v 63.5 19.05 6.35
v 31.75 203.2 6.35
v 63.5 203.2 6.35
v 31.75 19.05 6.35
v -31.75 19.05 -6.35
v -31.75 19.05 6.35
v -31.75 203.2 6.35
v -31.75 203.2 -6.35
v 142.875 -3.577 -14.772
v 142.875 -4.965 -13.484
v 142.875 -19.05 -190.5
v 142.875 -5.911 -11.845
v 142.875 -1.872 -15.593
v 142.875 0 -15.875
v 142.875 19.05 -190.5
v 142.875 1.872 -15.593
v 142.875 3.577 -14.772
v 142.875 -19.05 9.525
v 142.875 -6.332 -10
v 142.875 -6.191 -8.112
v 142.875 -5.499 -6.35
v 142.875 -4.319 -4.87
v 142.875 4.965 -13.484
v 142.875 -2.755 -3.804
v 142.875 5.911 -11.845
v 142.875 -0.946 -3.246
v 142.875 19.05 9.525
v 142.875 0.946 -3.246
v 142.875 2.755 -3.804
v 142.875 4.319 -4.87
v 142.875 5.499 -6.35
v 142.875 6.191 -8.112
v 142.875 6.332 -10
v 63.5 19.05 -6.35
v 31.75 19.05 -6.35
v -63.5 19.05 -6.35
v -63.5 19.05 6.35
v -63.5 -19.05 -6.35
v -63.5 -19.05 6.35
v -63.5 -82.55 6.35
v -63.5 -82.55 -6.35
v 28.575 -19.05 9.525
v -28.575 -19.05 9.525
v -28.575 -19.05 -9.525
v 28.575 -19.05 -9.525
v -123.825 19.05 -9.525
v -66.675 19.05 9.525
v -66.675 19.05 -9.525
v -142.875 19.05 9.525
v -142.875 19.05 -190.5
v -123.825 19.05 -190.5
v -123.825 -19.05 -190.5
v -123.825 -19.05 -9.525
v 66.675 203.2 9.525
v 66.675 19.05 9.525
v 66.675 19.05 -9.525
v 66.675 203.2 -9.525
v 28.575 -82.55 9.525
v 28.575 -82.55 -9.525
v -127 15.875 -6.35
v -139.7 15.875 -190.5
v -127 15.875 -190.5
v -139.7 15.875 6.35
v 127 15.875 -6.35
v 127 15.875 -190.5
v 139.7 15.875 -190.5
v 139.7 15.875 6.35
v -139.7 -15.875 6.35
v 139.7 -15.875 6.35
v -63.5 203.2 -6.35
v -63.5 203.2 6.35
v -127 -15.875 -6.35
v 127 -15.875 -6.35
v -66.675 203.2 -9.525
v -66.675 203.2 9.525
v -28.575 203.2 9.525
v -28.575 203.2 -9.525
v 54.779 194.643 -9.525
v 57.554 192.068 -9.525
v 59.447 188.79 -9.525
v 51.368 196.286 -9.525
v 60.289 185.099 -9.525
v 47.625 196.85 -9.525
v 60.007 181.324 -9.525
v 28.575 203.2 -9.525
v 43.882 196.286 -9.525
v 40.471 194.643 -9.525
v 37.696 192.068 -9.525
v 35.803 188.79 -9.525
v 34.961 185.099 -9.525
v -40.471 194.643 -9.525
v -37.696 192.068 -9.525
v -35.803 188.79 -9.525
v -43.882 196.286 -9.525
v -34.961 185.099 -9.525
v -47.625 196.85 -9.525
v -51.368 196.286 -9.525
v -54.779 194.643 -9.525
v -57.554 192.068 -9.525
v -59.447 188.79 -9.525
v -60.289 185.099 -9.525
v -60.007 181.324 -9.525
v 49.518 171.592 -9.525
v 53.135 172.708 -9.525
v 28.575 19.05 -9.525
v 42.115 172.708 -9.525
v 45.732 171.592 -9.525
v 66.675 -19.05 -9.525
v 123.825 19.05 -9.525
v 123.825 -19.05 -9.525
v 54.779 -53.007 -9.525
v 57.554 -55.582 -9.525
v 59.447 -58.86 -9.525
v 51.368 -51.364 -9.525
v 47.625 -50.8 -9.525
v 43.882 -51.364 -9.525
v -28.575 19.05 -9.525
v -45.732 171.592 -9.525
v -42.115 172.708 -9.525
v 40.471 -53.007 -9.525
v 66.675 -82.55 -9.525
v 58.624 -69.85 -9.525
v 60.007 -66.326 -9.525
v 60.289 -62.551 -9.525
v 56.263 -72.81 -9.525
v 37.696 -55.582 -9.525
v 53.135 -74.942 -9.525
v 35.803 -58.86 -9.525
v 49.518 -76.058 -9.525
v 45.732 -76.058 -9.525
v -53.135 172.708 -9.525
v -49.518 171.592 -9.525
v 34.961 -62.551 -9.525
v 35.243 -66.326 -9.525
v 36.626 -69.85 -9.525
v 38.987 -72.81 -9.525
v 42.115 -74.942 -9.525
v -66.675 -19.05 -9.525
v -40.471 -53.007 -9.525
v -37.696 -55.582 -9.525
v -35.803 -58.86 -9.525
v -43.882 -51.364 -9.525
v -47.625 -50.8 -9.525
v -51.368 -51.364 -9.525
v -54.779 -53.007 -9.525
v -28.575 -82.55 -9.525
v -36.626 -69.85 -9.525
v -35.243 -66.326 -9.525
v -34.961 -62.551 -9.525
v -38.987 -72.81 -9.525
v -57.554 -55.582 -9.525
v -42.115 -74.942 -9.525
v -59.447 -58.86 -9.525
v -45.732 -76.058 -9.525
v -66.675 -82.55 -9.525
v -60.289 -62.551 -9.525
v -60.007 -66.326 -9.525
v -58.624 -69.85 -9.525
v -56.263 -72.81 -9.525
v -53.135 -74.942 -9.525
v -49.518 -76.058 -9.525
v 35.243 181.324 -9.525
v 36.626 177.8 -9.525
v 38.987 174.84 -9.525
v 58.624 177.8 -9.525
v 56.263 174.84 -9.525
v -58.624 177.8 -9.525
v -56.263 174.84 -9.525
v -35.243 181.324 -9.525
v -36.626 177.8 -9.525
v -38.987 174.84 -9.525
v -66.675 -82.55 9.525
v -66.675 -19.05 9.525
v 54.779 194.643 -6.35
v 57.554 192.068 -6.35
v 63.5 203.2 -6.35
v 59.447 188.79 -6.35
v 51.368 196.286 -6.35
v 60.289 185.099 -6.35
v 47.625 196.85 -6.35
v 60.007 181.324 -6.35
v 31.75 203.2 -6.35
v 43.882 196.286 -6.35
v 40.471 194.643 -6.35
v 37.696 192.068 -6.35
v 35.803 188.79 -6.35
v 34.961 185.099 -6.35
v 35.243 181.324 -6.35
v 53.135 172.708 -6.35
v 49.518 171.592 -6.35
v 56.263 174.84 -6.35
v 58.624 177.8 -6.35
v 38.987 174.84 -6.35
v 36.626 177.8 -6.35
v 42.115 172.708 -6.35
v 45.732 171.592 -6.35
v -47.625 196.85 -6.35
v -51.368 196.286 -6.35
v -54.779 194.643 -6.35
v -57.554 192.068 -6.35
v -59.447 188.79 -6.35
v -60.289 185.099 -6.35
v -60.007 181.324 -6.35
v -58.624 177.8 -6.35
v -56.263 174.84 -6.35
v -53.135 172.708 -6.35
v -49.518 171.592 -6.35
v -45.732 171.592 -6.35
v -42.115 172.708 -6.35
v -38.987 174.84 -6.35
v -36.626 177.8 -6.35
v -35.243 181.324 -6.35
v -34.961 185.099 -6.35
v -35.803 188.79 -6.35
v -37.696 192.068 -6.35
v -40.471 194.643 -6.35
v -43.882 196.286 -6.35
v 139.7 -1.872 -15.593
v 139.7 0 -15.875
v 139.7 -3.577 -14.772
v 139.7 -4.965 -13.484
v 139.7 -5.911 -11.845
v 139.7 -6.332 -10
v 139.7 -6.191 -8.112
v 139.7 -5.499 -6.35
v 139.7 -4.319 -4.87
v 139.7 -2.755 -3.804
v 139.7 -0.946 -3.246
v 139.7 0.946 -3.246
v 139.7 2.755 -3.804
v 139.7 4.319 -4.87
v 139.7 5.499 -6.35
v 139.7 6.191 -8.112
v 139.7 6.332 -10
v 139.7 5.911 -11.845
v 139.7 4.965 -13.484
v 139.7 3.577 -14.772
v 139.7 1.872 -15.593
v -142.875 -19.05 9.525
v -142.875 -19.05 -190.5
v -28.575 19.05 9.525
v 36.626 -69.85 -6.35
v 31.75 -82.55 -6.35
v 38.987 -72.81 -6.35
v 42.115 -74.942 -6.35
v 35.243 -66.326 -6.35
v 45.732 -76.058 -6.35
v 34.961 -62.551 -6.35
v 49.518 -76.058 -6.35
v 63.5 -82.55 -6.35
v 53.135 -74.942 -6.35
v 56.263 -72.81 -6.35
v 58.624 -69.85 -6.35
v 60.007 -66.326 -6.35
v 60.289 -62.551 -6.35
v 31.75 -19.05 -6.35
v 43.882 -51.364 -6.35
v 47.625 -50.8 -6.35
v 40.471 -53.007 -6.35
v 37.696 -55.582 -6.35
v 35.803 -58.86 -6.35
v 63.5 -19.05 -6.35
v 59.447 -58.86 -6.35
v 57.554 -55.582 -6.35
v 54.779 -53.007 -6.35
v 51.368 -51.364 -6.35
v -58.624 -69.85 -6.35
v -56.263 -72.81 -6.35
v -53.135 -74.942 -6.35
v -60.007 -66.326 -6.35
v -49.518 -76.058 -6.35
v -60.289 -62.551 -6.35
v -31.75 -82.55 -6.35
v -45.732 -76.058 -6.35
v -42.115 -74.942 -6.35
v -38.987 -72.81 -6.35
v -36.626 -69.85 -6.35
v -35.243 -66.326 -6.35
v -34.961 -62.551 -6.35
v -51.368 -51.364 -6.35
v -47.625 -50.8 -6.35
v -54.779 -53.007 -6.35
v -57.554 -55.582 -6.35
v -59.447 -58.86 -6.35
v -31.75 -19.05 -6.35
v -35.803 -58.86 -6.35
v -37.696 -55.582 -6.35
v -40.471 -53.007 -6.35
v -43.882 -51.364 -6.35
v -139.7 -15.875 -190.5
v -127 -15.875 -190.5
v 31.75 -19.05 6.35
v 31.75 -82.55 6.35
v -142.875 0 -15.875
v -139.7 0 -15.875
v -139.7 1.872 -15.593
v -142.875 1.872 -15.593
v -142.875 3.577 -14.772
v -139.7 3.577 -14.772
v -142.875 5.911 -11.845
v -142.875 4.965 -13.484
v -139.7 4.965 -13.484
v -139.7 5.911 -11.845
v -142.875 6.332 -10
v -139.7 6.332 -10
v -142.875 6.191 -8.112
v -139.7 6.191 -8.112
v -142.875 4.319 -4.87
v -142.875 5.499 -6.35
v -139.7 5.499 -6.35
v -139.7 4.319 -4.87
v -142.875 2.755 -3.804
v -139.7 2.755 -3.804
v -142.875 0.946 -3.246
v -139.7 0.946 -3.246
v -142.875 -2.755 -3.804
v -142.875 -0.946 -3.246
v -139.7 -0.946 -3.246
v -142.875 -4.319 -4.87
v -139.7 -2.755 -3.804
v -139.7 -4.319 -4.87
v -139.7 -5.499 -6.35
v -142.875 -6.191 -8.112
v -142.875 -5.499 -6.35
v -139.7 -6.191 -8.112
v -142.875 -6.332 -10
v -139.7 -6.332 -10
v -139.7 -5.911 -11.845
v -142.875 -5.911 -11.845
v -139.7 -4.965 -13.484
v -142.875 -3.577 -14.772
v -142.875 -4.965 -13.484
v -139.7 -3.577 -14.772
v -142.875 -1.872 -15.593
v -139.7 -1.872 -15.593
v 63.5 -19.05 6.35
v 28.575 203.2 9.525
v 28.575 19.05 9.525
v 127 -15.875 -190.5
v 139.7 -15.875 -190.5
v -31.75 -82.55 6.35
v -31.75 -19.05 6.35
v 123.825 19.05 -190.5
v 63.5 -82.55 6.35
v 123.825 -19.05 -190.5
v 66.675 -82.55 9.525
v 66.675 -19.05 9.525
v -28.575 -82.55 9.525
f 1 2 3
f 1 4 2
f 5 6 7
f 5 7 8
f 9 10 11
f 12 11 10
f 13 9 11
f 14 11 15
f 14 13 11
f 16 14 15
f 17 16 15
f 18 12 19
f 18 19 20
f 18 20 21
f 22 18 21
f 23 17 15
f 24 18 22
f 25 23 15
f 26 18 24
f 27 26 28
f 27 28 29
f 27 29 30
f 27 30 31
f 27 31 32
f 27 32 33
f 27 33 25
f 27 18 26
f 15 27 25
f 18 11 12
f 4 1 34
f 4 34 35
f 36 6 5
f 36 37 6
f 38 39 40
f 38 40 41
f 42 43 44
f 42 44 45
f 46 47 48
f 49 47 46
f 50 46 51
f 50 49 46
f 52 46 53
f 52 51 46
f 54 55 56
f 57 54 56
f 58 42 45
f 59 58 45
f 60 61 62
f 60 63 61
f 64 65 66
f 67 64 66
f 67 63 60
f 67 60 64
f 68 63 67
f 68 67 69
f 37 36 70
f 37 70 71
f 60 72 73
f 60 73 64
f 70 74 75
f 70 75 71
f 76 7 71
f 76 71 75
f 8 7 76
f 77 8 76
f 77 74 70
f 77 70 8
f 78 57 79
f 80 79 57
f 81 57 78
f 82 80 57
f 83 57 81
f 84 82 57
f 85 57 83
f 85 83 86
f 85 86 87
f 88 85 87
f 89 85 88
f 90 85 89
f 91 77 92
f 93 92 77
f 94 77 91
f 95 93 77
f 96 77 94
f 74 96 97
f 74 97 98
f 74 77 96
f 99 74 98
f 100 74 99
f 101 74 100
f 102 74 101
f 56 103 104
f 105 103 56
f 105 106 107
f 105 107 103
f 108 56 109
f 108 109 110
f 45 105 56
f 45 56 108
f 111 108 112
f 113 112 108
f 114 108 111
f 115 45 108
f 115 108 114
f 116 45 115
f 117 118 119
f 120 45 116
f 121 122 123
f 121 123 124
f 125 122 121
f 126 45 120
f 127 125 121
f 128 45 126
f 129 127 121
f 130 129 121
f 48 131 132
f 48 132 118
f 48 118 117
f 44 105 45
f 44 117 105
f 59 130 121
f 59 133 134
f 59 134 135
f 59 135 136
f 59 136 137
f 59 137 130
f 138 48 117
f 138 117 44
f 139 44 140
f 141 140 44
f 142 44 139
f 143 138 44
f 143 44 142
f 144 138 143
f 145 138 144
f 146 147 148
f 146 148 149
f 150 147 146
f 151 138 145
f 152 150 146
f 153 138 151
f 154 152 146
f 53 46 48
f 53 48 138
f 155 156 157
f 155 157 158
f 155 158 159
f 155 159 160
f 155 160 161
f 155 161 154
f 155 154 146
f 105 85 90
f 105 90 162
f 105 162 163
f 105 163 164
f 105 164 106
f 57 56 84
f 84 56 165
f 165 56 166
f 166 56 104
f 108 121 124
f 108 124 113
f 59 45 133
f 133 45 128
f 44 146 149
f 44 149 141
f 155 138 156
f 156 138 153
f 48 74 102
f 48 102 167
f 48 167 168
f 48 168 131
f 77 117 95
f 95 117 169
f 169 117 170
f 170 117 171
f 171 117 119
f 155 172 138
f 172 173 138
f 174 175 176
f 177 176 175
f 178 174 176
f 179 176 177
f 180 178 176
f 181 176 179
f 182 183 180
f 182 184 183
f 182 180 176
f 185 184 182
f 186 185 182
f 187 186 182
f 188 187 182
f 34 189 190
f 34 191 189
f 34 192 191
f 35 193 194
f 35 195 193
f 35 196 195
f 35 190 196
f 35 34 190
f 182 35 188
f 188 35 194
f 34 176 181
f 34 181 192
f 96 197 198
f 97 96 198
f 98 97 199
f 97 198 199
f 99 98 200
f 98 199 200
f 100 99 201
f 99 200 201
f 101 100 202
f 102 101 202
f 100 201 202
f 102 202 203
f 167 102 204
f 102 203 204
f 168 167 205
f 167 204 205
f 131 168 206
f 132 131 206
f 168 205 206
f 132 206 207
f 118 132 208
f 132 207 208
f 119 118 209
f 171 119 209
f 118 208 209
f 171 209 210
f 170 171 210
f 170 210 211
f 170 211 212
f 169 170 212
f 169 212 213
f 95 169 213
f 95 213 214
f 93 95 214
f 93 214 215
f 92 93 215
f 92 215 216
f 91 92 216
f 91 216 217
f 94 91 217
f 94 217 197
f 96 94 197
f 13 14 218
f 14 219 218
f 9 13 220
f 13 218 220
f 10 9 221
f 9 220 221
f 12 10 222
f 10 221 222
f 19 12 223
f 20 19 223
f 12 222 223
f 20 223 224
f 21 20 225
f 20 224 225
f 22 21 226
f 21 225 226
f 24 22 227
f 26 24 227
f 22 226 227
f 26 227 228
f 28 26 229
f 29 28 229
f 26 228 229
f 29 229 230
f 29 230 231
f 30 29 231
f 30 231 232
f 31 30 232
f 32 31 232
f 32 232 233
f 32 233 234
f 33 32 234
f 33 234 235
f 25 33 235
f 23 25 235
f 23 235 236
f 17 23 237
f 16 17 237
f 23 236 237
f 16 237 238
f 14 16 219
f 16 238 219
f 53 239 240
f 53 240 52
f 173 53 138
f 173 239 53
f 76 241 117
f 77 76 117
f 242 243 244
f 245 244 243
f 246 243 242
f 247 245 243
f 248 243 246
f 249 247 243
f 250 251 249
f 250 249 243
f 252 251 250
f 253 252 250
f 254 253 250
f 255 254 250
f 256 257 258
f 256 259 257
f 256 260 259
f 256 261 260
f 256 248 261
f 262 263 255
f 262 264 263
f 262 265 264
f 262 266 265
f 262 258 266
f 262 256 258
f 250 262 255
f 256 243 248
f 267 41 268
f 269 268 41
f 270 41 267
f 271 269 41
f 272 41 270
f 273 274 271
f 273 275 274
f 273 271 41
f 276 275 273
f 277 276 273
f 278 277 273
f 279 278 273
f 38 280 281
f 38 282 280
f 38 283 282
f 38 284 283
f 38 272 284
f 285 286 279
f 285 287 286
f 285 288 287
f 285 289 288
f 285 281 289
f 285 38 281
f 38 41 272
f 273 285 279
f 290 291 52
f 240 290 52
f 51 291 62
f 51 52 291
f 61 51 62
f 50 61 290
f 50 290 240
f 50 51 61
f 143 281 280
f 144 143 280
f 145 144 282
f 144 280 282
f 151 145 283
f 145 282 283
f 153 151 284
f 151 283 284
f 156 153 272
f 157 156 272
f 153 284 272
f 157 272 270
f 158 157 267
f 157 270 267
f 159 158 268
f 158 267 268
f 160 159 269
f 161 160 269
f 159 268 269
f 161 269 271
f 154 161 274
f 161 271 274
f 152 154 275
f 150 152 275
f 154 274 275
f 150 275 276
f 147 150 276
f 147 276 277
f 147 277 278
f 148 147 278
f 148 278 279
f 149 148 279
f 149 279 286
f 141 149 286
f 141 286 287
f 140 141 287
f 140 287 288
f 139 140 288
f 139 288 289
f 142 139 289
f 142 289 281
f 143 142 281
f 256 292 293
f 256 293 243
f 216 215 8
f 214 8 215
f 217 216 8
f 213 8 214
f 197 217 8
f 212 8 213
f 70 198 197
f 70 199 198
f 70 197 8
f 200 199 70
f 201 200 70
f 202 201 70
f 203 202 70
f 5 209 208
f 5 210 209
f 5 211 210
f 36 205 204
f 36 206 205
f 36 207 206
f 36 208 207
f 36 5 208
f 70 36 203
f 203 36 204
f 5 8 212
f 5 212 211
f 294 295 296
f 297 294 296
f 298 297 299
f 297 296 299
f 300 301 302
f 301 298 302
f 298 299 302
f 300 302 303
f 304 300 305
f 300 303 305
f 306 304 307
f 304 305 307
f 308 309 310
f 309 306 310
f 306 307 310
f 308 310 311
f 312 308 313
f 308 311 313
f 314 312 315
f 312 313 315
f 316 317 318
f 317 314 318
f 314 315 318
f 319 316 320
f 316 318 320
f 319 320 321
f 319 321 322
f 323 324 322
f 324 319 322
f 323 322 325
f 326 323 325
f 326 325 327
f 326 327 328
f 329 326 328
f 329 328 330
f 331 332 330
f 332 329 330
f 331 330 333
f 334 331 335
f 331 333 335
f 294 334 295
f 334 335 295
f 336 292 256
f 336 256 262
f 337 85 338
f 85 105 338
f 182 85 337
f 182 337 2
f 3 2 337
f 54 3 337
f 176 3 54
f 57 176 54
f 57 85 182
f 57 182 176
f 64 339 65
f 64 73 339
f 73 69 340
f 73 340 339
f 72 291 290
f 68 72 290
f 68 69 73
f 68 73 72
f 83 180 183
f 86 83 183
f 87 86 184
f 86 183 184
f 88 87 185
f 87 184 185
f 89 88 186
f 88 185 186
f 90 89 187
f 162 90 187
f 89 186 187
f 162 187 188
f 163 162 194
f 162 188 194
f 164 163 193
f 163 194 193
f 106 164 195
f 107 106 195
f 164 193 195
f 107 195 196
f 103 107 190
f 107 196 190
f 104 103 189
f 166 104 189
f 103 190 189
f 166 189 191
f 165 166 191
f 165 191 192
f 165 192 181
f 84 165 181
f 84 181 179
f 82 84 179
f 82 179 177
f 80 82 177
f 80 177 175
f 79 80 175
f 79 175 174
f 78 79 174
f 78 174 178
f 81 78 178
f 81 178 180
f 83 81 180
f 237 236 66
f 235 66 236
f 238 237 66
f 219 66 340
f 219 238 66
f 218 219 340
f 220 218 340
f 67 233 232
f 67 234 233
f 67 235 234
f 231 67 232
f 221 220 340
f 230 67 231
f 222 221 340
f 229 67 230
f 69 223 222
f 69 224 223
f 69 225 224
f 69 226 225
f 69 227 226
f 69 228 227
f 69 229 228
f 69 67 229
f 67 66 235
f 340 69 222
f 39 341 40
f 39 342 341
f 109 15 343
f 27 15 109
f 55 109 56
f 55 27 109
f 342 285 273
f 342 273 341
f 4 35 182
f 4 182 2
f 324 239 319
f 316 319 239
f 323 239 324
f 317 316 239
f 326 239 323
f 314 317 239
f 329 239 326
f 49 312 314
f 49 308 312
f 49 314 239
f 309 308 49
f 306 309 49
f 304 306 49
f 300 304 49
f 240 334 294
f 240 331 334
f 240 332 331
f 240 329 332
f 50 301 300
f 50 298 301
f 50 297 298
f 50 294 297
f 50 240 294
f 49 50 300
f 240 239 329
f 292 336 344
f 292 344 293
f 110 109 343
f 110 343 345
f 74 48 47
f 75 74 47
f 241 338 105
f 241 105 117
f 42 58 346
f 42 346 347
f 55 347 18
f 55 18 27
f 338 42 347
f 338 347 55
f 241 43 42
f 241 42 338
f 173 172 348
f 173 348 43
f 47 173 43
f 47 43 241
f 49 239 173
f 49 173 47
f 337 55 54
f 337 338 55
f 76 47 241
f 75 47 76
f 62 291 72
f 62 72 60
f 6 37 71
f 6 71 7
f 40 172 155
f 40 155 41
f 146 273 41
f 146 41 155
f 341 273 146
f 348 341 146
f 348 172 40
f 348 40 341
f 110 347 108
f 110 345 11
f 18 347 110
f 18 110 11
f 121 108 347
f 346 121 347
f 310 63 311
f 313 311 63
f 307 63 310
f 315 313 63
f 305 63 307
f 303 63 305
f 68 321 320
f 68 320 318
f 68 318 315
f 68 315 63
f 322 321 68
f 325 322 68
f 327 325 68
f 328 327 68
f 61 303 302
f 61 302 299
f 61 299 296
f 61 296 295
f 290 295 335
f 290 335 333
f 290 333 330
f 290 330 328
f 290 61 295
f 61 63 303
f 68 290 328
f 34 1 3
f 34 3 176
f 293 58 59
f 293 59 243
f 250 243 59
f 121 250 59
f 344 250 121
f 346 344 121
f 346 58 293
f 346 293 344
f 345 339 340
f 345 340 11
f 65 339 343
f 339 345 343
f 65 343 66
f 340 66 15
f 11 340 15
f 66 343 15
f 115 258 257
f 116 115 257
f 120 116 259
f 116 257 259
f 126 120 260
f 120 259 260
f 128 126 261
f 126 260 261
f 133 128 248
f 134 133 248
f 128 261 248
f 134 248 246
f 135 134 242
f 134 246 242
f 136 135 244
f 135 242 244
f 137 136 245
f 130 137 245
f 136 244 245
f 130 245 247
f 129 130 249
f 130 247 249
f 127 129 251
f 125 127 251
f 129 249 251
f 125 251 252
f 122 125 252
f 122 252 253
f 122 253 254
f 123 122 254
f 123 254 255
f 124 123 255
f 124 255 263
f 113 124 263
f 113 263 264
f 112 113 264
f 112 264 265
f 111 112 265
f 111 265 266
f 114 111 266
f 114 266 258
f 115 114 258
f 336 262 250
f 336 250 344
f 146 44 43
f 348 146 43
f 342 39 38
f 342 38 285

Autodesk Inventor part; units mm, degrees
ref_plane "XZ Plane" through (0, 0, 0) normal (0, 1, 0) x (-1, 0, 0)
sketch "Sketch1" plane through (0, 0, 0) normal (0, 1, 0) x (-1, 0, 0)
  line L0 (0, 0) -> (133.35, 0)
  line L1 (133.35, 0) -> (133.35, -190.5)
  line L2 (0, 0) -> (0, -190.5) construction
  line L3 (0, 0) -> (-133.35, 0)
  line L4 (-133.35, 0) -> (-133.35, -190.5)
  dimension "d0" = 133.35
  dimension "d1" = 190.5
  dimension "d2" = 190.5
ref_plane "Work Plane1" through (0, 0, -190.5) normal (0, 0, 1) x (1, 0, 0)
sketch "Sketch3" plane through (0, 0, -190.5) normal (0, 0, 1) x (1, 0, 0)
  line L0 (142.875, -19.05) -> (123.825, -19.05)
  line L1 (123.825, -19.05) -> (123.825, 19.05)
  line L2 (123.825, 19.05) -> (142.875, 19.05)
  line L3 (142.875, 19.05) -> (142.875, -19.05)
  line L4 (142.875, -19.05) -> (123.825, 19.05) construction
  line L5 (123.825, -19.05) -> (142.875, 19.05) construction
  line L6 (139.7, -15.875) -> (127, -15.875)
  line L7 (127, -15.875) -> (127, 15.875)
  line L8 (127, 15.875) -> (139.7, 15.875)
  line L9 (139.7, 15.875) -> (139.7, -15.875)
  line L10 (139.7, -15.875) -> (127, 15.875) construction
  line L11 (127, -15.875) -> (139.7, 15.875) construction
  point P0 (0, 0)
  point P1 (133.35, 0)
  dimension "d4" = 38.1
  dimension "d5" = 19.05
  dimension "d6" = 133.35
  dimension "d7" = 3.175
  dimension "d8" = 3.175
sweep "Sweep1" add profiles "Sketch3" path "Sketch1"
sketch "Sketch4" plane through (123.825, 19.05, -190.5) normal (0, 1, 0) x (1, 0, 0)
  line L0 (-190.5, -200.025) -> (-152.4, -200.025)
  line L1 (-152.4, -200.025) -> (-152.4, -180.975)
  line L2 (-152.4, -180.975) -> (-190.5, -180.975)
  line L3 (-190.5, -180.975) -> (-190.5, -200.025)
  line L4 (-190.5, -200.025) -> (-152.4, -180.975) construction
  line L5 (-152.4, -200.025) -> (-190.5, -180.975) construction
  line L6 (-266.7, -200.025) -> (-266.7, 0) projected
  line L7 (-187.325, -196.85) -> (-155.575, -196.85)
  line L8 (-155.575, -196.85) -> (-155.575, -184.15)
  line L9 (-155.575, -184.15) -> (-187.325, -184.15)
  line L10 (-187.325, -184.15) -> (-187.325, -196.85)
  line L11 (-187.325, -196.85) -> (-155.575, -184.15) construction
  line L12 (-155.575, -196.85) -> (-187.325, -184.15) construction
  line L13 (3.175, -184.15) -> (-250.825, -184.15) projected
  point P0 (-123.825, -190.5)
  point P1 (-171.45, -190.5)
  dimension "d11" = 95.25
  dimension "d12" = 19.05
  dimension "d13" = 38.1
  dimension "d14" = 3.175
  dimension "d15" = 3.175
extrude "Extrusion1" add sketch "Sketch4" along normal blind 184.15 contours L3 L13 L10 L7 L8 L1 L0 | L3 L2 L1 L13 L9
sketch "Sketch5" plane through (123.825, -19.05, -190.5) normal (0, -1, 0) x (1, 0, 0)
  line L0 (-190.5, 180.975) -> (-152.4, 180.975)
  line L1 (-152.4, 180.975) -> (-152.4, 200.025)
  line L2 (-152.4, 200.025) -> (-190.5, 200.025)
  line L3 (-190.5, 200.025) -> (-190.5, 180.975)
  line L4 (-190.5, 180.975) -> (-152.4, 200.025) construction
  line L5 (-152.4, 180.975) -> (-190.5, 200.025) construction
  line L6 (-266.7, 200.025) -> (-266.7, 0) projected
  line L7 (-187.325, 184.15) -> (-155.575, 184.15)
  line L8 (-155.575, 184.15) -> (-155.575, 196.85)
  line L9 (-155.575, 196.85) -> (-187.325, 196.85)
  line L10 (-187.325, 196.85) -> (-187.325, 184.15)
  line L11 (-187.325, 184.15) -> (-155.575, 196.85) construction
  line L12 (-155.575, 184.15) -> (-187.325, 196.85) construction
  point P0 (-123.825, 190.5)
  point P1 (-171.45, 190.5)
  dimension "d18" = 95.25
  dimension "d19" = 19.05
  dimension "d20" = 38.1
  dimension "d21" = 3.175
  dimension "d22" = 3.175
extrude "Extrusion2" add sketch "Sketch5" along normal blind 63.5
mirror "Mirror1" about plane through (0, 0, 0) normal (1, 0, 0) of "Extrusion1", "Extrusion2"
sketch "Sketch6" plane through (142.875, -19.05, -190.5) normal (1, 0, 0) x (0, 0, -1)
  line L0 (-200.025, 0) -> (-200.025, 38.1) projected
  point P0 (-190.5, 19.05)
  point P1 (-180.975, 19.05)
  dimension "d25" = 19.05
hole "Hole1" at (142.875, 0, -9.525) direction (-1, 0, 0) diameter 12.7 depth 3.175 tip angle 118
sketch "Sketch7" plane through (-66.675, 19.05, -9.525) normal (0, 0, -1) x (-1, 0, 0)
  line L0 (-38.1, 184.15) -> (0, 184.15) construction
  line L1 (-19.05, 184.15) -> (-19.05, -101.6) construction
  line L2 (-34.925, -101.6) -> (-3.175, -101.6) construction
  line L3 (-95.25, 184.15) -> (-133.35, 184.15) construction
  line L4 (-114.3, 184.15) -> (-114.3, -101.6) construction
  line L5 (-133.35, -101.6) -> (-95.25, -101.6) construction
  point P0 (-66.675, -19.05)
  point P1 (-19.05, 165.1)
  point P2 (-19.05, -82.55)
  point P3 (-114.3, -82.55)
  point P4 (-114.3, 165.1)
  dimension "d33" = 19.05
  dimension "d34" = 19.05
  dimension "d35" = 19.05
  dimension "d36" = 19.05
hole "Hole2" at (-47.625, 184.15, -9.525) at (-47.625, -63.5, -9.525) at (47.625, -63.5, -9.525) at (47.625, 184.15, -9.525) direction (0, 0, 1) diameter 25.4 depth 3.175 tip angle 118
mirror "Mirror2" about plane through (0, 0, 0) normal (1, 0, 0) of "Hole1"
equation "\"d0\" = 0.5 * width"
equation "\"d1\" = length"
equation "\"d2\" = length"
equation "\"d4\" = tubingLength"
equation "\"d5\" = tubingWidth"
equation "\"d6\" = 0.5 * width"
equation "\"d7\" = tubeingWallWidth"
equation "\"d8\" = tubeingWallWidth"
equation "\"d12\" = tubingWidth"
equation "\"d13\" = tubingLength"
equation "\"d14\" = tubeingWallWidth"
equation "\"d15\" = tubeingWallWidth"
equation "\"d19\" = tubingWidth"
equation "\"d20\" = tubingLength"
equation "\"d21\" = tubeingWallWidth"
equation "\"d22\" = tubeingWallWidth"
equation "\"width\" = 266.7"
equation "\"length\" = 190.5"
equation "\"tubingWidth\" = 19.05"
equation "\"tubingLength\" = 38.1"
equation "\"tubeingWallWidth\" = 3.175"
equation "\"d3\" = -length"
properties part number "Shooter"
